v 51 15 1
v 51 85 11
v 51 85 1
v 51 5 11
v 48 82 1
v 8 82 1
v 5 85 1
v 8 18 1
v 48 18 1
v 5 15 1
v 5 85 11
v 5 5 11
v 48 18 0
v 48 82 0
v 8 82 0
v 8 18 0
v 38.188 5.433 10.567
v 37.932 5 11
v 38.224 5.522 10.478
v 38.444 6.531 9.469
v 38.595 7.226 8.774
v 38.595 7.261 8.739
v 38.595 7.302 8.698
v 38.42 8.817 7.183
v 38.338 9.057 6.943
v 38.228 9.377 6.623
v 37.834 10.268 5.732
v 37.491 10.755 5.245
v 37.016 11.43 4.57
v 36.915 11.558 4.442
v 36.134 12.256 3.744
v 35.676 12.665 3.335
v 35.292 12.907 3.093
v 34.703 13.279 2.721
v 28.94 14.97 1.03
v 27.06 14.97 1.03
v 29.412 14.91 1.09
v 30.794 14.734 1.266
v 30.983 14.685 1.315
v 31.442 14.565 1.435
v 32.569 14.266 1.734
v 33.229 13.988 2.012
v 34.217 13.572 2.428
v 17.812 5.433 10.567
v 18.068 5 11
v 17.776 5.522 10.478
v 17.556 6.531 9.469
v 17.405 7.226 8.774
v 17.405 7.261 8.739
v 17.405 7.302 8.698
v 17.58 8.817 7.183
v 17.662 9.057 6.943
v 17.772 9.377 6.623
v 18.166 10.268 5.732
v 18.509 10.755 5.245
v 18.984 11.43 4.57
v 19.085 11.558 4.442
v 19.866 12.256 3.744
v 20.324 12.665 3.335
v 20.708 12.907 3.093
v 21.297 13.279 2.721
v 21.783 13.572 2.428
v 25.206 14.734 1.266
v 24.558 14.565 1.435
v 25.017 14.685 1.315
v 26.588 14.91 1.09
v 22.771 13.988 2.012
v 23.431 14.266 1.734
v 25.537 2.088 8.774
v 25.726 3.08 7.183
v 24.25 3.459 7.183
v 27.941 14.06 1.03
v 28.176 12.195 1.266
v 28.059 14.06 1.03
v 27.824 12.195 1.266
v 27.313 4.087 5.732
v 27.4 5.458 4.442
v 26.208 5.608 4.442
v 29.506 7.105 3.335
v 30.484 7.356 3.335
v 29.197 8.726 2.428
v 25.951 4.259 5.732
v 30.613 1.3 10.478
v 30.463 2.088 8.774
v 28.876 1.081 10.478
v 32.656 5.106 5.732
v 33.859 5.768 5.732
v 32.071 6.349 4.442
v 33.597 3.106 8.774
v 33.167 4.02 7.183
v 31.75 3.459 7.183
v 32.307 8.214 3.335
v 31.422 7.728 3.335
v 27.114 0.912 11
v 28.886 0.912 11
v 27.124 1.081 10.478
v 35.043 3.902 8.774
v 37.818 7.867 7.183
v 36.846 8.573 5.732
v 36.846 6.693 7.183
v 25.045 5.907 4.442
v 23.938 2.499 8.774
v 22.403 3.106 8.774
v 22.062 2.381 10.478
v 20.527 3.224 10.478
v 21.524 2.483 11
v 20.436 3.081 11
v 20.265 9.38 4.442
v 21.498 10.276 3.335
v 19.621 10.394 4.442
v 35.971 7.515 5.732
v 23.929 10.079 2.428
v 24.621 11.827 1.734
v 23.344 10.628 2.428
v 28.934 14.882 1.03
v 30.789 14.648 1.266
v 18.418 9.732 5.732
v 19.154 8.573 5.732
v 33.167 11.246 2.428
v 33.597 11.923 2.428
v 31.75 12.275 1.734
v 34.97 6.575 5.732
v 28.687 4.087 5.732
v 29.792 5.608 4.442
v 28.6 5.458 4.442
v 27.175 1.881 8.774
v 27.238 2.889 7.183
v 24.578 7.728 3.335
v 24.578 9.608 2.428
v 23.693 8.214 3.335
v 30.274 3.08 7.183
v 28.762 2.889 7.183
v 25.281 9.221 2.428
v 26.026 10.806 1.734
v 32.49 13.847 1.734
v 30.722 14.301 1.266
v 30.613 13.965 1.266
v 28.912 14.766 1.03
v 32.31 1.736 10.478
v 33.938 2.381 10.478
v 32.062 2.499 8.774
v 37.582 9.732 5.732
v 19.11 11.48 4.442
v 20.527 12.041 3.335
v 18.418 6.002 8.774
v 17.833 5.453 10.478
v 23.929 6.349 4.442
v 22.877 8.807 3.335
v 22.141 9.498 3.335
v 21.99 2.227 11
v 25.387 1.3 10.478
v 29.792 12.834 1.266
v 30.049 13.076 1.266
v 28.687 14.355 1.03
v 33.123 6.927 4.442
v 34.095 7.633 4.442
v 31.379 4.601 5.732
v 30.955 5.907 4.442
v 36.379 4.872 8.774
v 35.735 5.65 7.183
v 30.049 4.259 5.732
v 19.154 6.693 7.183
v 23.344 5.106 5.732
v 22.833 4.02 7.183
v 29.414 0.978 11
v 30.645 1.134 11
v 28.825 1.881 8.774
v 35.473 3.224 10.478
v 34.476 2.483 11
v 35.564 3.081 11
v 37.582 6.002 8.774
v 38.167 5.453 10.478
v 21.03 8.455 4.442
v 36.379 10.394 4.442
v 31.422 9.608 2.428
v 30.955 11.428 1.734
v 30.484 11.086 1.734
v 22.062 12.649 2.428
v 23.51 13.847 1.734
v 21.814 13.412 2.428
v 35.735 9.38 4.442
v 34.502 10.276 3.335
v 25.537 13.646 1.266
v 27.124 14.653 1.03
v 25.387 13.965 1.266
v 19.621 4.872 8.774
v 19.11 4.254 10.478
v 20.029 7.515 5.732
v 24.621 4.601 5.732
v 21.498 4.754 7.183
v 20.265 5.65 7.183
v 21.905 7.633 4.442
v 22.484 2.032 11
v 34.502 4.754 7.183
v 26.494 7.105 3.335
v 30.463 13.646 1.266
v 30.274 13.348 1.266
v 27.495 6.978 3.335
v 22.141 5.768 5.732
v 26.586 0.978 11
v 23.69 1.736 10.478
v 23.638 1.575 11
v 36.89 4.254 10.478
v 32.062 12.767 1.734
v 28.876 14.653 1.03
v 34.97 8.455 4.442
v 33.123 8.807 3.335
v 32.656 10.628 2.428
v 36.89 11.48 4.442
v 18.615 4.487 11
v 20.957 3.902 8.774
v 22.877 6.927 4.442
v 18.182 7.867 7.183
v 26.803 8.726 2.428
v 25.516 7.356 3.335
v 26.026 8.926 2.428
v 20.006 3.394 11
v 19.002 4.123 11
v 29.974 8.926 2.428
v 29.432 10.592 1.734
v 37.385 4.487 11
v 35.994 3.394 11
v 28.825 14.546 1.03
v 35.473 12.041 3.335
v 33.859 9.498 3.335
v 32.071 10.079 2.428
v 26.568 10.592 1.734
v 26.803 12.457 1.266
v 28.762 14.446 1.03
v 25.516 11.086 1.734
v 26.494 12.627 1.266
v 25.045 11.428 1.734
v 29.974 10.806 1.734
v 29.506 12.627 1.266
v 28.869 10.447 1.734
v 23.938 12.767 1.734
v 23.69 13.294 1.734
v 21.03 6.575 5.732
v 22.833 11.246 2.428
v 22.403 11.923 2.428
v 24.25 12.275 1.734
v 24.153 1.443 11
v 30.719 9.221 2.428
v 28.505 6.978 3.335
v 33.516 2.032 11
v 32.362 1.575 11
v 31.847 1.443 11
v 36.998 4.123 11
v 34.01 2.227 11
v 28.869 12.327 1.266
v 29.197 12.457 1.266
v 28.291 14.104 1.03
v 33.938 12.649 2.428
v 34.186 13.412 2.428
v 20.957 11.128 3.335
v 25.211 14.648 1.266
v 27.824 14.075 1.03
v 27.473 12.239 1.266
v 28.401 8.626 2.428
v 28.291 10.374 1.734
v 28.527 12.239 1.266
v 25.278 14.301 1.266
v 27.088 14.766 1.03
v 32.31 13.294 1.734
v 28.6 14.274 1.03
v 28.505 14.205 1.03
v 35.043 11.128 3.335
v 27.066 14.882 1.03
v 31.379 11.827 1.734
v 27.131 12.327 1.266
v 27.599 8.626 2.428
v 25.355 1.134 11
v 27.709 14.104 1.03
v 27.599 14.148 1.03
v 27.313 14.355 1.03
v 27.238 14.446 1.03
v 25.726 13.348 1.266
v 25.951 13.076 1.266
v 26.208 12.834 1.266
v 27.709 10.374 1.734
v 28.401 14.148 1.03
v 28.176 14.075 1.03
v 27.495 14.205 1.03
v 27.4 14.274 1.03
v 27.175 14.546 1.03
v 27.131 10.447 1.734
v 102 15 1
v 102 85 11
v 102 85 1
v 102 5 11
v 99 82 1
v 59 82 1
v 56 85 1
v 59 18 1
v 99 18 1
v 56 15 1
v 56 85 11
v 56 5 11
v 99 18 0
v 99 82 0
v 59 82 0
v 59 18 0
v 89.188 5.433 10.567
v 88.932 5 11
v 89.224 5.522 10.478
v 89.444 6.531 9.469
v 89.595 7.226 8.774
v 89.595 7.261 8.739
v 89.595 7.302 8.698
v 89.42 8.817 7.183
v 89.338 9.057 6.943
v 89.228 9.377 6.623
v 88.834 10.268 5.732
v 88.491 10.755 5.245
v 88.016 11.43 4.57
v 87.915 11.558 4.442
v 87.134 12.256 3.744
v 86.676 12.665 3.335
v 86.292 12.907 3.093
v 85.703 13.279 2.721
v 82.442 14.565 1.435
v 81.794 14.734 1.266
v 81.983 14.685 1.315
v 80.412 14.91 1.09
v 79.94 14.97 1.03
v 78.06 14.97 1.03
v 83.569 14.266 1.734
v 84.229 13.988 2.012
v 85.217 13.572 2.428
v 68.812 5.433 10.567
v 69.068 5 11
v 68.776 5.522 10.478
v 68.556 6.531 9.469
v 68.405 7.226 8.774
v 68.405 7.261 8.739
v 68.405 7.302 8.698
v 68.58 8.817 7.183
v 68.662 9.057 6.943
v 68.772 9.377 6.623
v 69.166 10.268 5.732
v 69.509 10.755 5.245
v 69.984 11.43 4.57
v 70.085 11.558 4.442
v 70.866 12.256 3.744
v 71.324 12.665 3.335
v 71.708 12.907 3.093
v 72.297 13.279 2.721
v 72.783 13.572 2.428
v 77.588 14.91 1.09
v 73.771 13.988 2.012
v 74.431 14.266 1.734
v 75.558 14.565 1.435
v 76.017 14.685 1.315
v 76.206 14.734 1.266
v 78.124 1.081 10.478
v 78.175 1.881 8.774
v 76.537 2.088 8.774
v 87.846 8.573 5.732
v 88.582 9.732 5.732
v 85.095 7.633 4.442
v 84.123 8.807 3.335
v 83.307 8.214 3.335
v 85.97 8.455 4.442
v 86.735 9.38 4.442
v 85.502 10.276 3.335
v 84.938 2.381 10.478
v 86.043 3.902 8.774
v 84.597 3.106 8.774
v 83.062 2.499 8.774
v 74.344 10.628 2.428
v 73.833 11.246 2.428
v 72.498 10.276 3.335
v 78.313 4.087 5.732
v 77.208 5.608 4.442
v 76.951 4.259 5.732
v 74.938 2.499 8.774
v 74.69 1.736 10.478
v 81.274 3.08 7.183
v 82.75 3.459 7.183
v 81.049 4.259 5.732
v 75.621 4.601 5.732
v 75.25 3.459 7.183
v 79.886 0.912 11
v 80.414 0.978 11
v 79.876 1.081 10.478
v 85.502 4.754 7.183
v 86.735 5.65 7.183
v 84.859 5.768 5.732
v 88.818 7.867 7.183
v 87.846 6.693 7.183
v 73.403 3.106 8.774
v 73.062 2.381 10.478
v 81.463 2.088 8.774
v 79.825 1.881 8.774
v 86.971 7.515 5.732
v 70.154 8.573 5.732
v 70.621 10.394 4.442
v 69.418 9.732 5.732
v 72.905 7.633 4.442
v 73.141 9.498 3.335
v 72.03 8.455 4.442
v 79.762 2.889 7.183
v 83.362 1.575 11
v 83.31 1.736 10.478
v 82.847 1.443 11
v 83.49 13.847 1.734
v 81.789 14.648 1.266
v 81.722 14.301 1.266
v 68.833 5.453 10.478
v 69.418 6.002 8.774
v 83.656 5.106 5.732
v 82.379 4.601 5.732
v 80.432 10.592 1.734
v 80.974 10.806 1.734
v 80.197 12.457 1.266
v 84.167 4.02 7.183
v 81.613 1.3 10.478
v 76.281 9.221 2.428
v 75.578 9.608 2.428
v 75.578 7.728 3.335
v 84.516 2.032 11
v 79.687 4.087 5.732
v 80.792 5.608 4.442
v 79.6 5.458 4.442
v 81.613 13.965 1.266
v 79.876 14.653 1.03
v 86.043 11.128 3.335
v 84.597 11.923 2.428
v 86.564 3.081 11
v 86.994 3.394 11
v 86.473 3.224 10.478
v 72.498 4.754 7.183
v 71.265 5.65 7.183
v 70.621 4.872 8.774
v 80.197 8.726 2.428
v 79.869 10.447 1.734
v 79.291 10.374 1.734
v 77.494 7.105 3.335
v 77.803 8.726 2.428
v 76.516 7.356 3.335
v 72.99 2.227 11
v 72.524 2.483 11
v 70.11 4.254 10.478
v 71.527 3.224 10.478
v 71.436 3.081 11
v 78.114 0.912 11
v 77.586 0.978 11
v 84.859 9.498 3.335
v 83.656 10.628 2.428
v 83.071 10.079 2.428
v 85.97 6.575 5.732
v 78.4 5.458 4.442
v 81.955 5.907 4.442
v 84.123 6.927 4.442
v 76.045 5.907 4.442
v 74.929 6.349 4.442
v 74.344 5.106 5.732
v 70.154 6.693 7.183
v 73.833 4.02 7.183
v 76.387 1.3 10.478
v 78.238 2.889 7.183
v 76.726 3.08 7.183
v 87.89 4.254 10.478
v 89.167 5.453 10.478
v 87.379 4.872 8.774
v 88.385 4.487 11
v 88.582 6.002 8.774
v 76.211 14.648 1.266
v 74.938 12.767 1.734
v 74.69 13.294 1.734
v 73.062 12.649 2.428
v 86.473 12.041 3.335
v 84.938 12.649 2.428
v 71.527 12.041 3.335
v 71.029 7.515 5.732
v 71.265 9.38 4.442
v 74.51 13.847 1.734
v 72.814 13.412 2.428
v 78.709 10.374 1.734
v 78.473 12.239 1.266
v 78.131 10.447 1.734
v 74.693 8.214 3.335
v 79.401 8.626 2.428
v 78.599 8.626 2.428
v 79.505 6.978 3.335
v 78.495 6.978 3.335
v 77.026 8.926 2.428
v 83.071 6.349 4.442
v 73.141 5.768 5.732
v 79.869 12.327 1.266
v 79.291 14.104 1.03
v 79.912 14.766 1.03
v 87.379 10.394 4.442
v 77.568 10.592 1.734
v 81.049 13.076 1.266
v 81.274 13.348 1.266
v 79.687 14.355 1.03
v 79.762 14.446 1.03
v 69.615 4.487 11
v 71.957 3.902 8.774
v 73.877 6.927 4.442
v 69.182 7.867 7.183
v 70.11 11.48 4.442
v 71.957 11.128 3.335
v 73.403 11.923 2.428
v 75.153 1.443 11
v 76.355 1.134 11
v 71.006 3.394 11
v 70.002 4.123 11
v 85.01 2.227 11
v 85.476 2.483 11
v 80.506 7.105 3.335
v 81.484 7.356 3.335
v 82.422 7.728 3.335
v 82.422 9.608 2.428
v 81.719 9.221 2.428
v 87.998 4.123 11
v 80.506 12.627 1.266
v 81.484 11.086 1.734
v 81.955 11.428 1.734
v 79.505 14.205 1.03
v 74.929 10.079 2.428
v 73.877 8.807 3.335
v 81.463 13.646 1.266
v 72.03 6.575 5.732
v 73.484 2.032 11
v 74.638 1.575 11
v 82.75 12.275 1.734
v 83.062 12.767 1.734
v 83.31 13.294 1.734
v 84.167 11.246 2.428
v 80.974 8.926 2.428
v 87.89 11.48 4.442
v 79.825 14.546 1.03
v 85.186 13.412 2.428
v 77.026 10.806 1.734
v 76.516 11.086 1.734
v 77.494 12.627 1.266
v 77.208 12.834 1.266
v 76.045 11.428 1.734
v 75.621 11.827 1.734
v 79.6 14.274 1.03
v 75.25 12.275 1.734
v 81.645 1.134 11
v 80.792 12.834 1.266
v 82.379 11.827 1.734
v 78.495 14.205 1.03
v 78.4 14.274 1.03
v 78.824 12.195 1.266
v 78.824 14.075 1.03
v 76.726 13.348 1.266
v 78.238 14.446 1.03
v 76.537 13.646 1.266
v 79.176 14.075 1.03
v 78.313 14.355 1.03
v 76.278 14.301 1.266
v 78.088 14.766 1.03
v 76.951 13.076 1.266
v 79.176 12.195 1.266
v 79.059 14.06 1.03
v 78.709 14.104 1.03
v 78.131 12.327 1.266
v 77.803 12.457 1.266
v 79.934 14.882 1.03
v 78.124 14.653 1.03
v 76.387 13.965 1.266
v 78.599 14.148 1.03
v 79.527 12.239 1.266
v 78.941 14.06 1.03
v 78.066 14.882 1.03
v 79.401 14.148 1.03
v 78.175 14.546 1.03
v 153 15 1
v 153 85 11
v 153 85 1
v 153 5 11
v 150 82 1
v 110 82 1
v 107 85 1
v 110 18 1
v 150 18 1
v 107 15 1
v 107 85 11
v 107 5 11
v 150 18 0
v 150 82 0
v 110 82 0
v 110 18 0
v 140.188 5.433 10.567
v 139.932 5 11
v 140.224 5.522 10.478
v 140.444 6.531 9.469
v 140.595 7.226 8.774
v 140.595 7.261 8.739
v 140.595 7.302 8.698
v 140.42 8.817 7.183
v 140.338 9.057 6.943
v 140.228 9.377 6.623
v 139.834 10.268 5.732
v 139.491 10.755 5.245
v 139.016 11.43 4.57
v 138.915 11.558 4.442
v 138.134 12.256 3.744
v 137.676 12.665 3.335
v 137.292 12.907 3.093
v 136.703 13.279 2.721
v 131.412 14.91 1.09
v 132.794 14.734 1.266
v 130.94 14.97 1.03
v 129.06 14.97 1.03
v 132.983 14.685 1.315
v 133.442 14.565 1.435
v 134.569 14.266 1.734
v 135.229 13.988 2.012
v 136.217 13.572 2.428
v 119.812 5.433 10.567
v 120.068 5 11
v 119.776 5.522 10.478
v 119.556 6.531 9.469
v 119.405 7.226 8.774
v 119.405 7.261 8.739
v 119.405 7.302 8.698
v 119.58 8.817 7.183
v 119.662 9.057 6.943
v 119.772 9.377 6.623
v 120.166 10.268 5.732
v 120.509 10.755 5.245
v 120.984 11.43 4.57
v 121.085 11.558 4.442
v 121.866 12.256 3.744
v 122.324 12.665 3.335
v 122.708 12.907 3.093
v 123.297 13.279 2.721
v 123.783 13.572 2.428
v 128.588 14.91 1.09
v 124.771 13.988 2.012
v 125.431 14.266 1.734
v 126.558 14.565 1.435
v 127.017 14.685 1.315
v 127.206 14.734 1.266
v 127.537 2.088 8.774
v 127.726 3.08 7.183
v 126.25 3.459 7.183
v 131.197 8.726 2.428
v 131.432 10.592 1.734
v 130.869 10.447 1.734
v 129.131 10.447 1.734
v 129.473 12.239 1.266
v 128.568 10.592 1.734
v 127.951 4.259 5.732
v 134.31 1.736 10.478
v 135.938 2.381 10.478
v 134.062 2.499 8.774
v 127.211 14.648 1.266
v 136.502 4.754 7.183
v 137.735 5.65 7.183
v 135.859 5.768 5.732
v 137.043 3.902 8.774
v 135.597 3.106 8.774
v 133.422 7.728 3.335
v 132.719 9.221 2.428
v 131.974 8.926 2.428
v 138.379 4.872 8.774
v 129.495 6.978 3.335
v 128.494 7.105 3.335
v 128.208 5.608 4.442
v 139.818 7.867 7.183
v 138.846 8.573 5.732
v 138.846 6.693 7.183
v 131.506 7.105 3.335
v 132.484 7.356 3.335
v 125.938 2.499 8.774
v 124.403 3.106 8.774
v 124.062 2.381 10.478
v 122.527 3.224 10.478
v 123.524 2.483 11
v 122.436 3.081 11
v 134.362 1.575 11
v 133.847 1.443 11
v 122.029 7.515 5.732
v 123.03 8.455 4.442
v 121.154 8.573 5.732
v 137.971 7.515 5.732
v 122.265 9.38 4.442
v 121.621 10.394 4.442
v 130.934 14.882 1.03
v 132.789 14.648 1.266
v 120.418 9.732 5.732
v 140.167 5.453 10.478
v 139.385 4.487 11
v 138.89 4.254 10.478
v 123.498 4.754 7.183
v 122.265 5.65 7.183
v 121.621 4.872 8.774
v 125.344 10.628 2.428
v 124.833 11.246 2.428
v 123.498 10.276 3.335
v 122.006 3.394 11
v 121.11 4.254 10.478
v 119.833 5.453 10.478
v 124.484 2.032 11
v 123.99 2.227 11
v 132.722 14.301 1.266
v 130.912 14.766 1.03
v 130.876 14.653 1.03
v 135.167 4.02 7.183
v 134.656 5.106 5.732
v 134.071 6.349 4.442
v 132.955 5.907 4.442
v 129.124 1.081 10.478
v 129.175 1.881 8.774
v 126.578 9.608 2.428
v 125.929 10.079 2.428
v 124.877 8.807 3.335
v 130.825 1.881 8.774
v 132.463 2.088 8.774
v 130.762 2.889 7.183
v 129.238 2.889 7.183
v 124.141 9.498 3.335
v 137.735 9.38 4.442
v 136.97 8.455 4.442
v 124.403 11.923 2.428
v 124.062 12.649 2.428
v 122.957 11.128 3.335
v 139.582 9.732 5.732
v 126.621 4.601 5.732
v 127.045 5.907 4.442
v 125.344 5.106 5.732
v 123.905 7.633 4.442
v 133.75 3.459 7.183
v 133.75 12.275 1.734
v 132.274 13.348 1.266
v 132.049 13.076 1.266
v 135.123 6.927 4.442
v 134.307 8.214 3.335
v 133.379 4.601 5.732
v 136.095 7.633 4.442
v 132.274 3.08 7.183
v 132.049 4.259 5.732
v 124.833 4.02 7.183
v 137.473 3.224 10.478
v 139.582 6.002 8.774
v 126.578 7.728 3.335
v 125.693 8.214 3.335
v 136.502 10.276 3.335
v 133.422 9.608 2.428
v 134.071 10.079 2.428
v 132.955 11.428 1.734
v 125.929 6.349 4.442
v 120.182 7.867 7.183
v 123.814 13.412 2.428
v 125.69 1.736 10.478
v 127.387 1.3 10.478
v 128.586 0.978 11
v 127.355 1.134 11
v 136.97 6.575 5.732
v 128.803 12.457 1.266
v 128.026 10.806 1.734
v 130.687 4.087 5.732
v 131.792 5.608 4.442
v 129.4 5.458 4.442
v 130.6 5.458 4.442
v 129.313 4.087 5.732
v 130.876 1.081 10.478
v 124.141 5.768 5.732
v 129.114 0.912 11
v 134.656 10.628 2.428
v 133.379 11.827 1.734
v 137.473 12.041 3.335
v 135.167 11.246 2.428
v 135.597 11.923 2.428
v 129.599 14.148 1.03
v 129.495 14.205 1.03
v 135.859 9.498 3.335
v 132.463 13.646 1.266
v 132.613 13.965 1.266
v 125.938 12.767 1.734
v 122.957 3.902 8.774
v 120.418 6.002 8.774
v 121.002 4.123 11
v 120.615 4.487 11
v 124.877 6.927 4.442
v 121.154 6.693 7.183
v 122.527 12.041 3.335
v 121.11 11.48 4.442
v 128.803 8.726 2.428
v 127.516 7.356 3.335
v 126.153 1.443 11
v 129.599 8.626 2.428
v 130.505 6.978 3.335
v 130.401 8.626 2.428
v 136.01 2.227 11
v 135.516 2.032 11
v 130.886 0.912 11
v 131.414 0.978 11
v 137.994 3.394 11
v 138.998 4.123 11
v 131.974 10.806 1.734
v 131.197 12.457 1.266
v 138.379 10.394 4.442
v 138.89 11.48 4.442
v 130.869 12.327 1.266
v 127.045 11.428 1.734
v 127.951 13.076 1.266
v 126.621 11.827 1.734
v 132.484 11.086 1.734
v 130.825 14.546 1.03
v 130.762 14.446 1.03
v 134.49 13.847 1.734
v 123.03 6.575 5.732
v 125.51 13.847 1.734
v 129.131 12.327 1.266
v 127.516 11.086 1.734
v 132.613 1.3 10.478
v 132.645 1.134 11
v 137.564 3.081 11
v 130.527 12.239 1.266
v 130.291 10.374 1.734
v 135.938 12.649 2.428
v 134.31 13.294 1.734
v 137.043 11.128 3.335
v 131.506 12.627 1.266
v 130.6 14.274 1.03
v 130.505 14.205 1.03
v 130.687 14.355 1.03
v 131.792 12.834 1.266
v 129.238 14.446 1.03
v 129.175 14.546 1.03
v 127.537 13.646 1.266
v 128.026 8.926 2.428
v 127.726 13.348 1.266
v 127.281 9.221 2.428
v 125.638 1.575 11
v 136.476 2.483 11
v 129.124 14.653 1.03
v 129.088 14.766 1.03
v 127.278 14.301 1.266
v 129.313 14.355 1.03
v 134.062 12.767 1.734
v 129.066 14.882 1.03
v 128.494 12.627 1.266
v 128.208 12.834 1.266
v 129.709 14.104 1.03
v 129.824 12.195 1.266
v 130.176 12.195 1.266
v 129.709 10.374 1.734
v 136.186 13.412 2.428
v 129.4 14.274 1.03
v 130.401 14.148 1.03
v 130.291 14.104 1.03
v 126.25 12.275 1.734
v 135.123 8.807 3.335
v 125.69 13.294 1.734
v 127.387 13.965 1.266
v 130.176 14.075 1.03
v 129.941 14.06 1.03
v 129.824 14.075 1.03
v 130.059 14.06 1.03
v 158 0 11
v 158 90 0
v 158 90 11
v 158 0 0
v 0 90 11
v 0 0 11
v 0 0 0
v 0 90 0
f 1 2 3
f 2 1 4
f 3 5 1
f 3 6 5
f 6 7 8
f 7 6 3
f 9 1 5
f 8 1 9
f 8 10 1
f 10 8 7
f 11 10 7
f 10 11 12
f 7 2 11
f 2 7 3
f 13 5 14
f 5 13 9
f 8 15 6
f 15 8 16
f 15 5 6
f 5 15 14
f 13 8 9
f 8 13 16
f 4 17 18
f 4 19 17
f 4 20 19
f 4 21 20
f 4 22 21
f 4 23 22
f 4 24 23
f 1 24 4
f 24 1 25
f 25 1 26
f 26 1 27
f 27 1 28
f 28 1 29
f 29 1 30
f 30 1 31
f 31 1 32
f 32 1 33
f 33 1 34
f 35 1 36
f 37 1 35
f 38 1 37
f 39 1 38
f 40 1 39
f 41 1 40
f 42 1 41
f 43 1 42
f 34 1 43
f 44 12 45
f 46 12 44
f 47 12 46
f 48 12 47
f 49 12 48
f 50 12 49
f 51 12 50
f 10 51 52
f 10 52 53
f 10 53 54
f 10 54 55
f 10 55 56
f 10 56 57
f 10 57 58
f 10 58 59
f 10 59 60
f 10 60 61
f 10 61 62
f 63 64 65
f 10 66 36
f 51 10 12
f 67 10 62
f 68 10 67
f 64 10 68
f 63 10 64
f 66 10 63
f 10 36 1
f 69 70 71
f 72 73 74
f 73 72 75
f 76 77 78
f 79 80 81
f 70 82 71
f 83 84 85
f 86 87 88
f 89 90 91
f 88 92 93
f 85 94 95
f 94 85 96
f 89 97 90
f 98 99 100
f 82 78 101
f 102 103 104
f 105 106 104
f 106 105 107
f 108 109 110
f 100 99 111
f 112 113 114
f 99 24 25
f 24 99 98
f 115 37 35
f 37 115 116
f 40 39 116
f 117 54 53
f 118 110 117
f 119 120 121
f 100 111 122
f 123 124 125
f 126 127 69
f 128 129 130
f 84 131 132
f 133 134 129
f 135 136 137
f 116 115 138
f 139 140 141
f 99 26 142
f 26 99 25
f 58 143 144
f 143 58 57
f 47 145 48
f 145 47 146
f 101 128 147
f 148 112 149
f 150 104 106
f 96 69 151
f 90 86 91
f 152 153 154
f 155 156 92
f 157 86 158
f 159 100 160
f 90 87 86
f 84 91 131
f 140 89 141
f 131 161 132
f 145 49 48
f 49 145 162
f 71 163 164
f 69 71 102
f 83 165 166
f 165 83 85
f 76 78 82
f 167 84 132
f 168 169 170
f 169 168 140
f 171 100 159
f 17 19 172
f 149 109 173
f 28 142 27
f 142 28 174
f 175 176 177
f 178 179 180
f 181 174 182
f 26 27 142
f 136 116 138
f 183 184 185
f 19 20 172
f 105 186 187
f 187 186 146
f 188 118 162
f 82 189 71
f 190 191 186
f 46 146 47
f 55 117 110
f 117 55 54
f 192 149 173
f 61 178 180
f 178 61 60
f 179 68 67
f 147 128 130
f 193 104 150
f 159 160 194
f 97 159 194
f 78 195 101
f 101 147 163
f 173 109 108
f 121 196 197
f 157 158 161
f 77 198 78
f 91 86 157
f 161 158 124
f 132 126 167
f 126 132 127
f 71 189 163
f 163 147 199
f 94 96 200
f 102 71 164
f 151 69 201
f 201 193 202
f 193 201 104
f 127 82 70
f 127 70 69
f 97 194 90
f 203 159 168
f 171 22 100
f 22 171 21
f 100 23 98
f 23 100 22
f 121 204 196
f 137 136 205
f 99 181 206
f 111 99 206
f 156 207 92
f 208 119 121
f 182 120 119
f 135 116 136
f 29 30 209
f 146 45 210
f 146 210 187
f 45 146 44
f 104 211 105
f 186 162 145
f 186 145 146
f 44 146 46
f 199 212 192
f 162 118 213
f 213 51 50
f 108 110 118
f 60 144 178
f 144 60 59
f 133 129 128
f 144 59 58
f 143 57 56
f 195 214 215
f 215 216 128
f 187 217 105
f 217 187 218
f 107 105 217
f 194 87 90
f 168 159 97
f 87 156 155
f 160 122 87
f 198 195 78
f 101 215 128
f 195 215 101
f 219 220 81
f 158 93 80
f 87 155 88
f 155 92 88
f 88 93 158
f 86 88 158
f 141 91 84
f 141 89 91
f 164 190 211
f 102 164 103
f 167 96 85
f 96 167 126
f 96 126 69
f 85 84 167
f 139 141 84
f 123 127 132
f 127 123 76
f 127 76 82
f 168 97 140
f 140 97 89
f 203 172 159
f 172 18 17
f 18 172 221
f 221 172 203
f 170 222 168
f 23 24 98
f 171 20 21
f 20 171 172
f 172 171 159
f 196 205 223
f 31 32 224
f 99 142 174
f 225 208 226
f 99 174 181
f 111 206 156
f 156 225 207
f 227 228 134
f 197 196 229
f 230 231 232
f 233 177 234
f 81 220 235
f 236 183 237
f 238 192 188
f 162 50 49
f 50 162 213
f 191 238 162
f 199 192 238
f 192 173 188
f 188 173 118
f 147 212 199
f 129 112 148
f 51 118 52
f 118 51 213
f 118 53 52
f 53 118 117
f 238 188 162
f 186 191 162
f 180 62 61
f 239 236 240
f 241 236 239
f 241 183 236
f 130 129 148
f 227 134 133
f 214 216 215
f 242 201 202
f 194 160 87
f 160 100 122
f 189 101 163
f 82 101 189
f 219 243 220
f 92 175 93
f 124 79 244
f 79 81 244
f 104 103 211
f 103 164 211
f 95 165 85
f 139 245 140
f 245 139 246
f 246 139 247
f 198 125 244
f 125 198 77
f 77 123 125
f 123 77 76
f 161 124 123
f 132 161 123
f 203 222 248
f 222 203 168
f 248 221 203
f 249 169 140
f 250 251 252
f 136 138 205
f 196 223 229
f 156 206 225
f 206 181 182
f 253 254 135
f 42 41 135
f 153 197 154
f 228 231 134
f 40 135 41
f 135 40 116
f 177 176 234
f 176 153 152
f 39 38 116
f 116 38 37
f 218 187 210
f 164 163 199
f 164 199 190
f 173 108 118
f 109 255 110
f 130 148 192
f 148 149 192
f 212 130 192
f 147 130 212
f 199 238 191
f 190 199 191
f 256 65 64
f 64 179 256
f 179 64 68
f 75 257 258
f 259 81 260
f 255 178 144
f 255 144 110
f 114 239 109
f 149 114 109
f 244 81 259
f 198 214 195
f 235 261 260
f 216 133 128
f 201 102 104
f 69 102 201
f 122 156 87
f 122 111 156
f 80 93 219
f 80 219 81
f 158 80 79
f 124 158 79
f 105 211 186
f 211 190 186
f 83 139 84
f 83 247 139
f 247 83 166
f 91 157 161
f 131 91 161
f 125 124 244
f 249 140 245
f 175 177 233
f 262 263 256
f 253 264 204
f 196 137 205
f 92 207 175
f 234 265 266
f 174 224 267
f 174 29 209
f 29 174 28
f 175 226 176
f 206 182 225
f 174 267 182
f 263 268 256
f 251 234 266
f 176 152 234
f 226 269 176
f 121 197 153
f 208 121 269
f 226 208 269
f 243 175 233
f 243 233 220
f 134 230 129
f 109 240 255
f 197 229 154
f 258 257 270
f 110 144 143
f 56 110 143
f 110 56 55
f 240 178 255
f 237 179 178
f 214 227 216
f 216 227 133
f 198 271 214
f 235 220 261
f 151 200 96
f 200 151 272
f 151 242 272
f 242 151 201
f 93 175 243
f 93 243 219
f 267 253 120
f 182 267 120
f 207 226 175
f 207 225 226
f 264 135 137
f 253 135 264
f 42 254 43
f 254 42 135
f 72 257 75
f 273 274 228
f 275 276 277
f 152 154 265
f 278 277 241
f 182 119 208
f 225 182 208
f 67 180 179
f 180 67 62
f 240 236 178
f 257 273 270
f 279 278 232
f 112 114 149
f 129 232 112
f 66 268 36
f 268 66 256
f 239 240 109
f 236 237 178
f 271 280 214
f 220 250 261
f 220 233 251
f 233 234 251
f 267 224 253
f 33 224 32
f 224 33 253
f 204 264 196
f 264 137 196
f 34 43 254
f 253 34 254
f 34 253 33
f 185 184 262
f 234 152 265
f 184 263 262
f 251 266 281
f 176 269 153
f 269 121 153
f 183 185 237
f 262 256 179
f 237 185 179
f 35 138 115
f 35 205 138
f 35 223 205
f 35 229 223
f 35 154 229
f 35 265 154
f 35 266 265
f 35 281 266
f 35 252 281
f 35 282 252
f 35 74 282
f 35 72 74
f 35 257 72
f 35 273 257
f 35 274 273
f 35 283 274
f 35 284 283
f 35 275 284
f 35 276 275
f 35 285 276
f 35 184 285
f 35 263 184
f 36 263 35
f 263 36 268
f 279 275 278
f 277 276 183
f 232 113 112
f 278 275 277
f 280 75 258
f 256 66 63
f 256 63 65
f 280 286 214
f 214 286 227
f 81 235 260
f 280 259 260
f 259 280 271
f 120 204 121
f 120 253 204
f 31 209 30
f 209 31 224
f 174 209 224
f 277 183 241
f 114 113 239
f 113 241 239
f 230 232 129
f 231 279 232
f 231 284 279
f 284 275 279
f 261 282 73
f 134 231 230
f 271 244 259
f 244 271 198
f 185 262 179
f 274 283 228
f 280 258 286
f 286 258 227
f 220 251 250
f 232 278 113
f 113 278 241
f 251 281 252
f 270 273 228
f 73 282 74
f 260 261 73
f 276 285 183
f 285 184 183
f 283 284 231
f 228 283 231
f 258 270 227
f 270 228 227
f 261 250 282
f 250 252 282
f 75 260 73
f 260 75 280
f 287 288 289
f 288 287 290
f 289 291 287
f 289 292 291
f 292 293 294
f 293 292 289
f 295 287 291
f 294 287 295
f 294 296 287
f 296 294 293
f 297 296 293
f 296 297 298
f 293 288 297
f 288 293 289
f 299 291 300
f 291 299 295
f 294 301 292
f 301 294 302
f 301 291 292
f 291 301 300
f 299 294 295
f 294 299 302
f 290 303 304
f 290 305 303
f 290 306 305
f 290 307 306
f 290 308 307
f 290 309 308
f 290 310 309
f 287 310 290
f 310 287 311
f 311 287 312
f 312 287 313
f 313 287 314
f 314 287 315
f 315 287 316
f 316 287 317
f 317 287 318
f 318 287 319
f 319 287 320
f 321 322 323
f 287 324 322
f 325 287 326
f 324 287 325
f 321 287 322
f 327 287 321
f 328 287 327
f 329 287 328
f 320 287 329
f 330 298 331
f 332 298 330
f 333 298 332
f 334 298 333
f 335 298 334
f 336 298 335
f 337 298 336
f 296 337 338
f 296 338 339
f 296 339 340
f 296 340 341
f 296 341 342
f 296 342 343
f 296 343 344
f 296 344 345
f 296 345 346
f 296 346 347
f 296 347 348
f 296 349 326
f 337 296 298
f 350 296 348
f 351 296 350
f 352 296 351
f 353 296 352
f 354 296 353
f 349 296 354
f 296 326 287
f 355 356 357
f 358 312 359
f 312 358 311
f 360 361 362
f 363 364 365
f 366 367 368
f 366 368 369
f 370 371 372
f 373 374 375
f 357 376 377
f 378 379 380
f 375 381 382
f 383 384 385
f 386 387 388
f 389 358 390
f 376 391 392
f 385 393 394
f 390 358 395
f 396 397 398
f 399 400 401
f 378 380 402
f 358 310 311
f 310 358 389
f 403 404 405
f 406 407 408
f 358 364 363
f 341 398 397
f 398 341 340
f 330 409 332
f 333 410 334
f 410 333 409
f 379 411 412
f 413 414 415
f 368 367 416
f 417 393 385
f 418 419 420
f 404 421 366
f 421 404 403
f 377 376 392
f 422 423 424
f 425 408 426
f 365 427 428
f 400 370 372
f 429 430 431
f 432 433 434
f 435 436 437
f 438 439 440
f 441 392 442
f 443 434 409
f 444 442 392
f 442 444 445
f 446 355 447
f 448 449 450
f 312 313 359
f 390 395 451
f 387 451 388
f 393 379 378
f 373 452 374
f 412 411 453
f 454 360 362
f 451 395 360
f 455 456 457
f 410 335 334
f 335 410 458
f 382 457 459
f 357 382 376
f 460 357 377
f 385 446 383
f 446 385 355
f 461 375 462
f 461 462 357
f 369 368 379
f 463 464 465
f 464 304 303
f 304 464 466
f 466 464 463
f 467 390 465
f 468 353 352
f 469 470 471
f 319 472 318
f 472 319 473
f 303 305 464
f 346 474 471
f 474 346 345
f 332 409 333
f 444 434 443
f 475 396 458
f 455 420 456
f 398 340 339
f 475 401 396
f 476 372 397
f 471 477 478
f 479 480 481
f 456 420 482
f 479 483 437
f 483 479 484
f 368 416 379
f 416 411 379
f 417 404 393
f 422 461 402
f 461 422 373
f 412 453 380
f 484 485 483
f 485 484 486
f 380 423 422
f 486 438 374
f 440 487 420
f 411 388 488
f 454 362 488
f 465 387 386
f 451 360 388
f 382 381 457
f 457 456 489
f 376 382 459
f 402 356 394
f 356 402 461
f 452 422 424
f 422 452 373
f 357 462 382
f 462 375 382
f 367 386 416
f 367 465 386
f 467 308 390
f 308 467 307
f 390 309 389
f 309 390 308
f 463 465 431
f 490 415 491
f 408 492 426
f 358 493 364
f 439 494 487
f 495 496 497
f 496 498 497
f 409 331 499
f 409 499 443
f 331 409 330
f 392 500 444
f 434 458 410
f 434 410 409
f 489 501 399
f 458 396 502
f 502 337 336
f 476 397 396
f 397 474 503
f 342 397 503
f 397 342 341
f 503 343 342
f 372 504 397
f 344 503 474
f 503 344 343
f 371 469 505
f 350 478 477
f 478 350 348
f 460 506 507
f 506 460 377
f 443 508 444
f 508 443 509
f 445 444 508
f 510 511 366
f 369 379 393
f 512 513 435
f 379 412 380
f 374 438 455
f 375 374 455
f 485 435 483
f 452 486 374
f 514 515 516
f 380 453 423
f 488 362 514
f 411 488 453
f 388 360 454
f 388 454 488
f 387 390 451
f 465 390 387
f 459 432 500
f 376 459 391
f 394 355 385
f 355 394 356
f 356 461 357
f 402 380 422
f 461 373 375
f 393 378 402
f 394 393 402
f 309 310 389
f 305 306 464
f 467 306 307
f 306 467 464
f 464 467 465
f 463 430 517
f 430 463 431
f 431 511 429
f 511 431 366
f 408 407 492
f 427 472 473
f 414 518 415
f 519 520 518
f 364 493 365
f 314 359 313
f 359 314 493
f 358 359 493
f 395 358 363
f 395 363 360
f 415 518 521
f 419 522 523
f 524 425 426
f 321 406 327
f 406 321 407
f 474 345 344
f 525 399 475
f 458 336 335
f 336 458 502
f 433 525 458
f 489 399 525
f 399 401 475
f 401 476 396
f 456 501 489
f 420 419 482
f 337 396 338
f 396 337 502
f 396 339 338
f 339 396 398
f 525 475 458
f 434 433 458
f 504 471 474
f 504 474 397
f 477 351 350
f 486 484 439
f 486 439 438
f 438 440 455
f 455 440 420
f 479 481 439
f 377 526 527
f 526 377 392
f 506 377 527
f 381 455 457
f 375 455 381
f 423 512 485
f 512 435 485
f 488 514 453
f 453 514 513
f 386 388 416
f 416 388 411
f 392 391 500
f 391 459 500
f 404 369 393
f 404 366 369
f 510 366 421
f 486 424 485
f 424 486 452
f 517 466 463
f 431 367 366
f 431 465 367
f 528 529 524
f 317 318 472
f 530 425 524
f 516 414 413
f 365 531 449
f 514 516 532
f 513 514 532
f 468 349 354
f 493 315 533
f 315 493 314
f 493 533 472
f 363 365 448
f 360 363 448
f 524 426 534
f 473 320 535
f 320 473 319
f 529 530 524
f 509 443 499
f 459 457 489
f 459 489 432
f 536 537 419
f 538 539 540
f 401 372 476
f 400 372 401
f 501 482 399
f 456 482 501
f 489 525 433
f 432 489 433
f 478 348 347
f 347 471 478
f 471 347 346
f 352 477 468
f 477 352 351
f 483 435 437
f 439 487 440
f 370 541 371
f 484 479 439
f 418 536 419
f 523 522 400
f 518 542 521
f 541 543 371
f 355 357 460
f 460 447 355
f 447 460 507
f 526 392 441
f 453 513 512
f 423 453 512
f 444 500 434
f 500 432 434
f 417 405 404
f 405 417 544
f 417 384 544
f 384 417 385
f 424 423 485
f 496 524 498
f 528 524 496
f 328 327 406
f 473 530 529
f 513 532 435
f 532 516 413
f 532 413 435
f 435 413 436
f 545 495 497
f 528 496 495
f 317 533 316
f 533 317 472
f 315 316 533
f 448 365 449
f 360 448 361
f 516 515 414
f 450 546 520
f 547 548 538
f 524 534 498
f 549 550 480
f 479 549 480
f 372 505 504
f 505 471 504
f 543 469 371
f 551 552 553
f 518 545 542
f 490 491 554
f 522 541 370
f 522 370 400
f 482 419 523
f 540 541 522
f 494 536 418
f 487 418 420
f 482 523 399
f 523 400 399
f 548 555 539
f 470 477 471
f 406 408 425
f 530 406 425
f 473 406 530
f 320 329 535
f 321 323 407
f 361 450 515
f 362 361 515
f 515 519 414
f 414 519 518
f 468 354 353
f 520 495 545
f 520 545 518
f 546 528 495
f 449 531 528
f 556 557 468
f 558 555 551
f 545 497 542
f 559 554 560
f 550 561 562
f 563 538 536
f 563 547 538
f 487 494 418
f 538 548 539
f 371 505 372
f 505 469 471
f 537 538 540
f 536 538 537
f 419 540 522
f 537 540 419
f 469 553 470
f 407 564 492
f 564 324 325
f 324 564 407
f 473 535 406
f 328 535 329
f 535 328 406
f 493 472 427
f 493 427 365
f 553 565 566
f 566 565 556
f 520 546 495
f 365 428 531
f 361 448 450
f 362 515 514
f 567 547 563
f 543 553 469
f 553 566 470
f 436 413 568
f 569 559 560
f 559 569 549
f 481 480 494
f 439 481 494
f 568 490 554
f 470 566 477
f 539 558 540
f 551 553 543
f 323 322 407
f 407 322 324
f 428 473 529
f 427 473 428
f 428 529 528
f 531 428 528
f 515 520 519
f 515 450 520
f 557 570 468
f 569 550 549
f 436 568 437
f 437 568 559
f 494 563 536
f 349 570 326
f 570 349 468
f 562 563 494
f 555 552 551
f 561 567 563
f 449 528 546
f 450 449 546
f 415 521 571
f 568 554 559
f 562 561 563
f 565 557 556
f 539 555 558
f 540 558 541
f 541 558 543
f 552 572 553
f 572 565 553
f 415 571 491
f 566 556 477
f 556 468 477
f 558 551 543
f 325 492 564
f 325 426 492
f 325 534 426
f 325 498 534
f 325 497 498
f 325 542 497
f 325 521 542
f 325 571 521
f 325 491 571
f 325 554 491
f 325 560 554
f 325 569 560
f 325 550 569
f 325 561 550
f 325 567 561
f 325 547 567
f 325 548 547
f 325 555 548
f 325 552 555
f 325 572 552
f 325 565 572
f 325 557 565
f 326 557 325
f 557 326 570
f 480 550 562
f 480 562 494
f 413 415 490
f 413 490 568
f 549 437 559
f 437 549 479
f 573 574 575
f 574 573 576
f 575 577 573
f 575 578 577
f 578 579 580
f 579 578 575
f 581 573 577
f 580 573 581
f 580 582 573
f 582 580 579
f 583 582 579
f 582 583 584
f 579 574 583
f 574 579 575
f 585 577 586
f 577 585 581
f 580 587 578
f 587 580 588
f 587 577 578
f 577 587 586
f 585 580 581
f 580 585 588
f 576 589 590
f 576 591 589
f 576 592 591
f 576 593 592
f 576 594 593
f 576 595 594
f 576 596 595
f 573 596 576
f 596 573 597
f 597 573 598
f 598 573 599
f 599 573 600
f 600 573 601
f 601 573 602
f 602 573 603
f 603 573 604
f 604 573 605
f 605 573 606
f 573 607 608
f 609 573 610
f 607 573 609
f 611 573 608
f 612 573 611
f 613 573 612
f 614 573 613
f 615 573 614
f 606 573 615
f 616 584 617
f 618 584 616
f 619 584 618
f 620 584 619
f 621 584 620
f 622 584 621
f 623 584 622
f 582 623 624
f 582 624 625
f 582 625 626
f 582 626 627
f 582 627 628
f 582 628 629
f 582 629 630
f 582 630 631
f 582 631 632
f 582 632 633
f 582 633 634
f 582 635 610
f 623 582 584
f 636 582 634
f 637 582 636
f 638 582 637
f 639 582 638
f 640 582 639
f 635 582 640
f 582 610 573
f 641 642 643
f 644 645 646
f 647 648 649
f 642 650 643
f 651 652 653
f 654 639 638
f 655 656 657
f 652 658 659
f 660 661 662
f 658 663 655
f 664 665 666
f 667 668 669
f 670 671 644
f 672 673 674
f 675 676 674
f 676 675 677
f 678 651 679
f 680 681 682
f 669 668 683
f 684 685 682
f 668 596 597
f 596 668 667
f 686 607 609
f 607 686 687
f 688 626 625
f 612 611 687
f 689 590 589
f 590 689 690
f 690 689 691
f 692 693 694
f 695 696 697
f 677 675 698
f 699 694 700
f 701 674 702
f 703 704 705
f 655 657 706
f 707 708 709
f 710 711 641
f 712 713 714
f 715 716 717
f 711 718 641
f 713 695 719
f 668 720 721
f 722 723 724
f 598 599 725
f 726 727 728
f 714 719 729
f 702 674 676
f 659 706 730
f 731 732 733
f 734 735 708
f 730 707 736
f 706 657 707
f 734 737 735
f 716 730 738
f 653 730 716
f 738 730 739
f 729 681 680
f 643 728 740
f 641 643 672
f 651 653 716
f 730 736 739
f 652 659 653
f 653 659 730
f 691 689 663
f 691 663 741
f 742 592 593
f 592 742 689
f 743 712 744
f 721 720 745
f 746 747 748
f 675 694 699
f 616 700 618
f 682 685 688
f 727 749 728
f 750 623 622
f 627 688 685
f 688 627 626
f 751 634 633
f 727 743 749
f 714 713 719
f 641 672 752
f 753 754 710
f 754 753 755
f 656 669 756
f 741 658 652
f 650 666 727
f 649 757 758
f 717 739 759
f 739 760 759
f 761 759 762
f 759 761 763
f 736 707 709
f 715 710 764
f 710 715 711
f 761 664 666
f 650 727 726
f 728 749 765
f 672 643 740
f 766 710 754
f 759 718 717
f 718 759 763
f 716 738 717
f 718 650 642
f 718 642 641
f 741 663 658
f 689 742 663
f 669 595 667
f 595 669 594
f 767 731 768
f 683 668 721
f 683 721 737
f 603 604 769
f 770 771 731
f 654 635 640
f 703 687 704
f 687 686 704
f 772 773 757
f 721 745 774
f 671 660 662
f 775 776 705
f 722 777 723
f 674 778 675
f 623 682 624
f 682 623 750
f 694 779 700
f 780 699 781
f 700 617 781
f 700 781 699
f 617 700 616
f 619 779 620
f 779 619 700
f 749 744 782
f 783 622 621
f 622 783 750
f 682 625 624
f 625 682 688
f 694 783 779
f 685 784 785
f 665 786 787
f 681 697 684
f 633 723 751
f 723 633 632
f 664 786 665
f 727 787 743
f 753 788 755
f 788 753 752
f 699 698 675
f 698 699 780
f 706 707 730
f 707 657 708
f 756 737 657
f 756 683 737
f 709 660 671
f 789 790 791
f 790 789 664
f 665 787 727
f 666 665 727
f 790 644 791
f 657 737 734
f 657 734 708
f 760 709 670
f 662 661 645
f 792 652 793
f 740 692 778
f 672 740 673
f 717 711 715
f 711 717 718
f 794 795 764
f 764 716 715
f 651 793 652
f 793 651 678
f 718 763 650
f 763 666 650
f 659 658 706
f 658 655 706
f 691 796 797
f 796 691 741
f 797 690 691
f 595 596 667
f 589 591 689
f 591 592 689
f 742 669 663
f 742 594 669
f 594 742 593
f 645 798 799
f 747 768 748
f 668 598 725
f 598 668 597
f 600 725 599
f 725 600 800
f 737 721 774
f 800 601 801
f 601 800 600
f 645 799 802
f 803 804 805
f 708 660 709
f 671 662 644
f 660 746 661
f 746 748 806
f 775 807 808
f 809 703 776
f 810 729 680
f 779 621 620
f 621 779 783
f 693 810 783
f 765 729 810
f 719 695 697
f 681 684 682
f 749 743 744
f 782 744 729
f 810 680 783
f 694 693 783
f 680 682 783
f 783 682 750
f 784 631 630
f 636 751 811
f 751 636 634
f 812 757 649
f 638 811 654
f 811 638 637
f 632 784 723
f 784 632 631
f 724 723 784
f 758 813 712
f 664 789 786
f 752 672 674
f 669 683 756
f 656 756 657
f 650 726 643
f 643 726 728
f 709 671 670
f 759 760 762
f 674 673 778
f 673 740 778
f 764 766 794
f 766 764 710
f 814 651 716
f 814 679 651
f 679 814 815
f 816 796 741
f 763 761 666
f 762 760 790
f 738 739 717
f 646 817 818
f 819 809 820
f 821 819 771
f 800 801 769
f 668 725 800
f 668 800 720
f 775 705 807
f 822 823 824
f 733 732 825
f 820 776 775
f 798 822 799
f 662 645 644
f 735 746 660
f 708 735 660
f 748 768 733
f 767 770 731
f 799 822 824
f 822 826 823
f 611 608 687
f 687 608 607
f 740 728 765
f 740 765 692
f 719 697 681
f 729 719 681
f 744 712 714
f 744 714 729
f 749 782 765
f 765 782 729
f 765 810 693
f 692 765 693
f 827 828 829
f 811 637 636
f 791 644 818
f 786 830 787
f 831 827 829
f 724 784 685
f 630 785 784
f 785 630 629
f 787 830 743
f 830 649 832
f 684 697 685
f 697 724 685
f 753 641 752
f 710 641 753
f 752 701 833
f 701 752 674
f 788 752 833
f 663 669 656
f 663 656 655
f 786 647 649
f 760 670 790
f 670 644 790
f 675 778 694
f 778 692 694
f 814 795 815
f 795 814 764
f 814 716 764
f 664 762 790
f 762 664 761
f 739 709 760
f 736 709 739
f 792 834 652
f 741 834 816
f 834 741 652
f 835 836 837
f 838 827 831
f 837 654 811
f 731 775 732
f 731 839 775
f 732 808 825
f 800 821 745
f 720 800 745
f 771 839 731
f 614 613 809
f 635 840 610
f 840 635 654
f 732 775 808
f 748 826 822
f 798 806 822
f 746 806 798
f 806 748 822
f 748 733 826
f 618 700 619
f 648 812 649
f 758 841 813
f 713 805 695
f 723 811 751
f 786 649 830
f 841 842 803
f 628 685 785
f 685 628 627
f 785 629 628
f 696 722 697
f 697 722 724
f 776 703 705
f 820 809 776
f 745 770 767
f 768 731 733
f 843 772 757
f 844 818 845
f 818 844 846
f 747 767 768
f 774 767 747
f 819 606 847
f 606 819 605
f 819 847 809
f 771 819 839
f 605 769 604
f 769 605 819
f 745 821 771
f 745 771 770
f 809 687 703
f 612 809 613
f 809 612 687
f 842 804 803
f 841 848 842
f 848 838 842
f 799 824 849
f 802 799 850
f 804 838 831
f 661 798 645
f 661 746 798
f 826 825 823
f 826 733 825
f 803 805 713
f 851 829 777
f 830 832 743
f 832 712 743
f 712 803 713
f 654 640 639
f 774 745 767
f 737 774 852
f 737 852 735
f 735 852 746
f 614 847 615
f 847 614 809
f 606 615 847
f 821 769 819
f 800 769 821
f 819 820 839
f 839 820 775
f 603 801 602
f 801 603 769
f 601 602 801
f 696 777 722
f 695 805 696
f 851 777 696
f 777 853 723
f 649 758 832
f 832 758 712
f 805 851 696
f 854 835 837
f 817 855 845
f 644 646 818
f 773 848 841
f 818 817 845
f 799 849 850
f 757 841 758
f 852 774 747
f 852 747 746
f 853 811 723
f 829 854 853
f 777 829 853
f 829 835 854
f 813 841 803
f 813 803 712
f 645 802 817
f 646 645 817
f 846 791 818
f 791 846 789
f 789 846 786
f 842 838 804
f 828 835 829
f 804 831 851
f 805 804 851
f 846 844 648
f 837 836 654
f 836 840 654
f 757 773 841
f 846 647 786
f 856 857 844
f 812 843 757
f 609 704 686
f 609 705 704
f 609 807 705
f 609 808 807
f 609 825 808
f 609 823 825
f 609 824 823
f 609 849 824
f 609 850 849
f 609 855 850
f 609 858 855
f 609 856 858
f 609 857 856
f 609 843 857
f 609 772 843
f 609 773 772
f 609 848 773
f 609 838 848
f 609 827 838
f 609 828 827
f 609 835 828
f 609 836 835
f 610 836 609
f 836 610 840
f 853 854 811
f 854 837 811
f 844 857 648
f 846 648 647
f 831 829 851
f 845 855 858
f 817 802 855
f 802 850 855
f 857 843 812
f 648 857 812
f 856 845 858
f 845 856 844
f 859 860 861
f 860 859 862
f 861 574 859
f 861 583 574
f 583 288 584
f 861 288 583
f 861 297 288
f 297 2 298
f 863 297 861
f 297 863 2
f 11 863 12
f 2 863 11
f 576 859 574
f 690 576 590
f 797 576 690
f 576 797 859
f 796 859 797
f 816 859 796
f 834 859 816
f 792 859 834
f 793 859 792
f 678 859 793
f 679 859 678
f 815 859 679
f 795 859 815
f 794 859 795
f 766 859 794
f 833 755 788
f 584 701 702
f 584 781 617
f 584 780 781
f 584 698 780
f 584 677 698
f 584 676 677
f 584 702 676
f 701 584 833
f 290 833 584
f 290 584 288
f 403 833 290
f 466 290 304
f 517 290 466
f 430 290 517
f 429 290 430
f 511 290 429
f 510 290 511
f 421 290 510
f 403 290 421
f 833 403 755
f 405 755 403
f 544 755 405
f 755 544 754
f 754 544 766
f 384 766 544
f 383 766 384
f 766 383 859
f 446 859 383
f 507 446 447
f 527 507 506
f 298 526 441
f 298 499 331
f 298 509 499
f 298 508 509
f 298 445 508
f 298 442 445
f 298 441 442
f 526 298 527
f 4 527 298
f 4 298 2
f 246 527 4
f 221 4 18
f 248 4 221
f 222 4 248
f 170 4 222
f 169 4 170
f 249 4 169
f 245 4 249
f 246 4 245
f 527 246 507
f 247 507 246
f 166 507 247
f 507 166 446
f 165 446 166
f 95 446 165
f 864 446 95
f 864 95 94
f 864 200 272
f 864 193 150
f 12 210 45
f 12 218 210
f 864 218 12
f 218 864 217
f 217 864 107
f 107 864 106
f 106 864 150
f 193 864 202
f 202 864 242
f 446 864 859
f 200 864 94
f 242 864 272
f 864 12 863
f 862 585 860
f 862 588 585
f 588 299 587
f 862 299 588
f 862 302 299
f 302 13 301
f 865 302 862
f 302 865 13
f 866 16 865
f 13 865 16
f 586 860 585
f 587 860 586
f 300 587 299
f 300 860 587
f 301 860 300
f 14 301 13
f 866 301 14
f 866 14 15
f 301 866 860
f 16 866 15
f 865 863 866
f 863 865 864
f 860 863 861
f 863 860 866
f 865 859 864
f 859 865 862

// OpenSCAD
// All measurements are in millimeters.

/* [Parameters] */

// The width of a card. We'll add buffer space later, so measure this as accurately as possible.
card_width = 44;

// The height of a card. We'll add buffer space later, so measure this as accurately as possible.
card_height = 68;

// The number of card wells.
number_of_wells = 3; // [1:6]

// The depth of the wells. 25 cards fit nicely per 10mm.
well_depth = 10;

/* [Tweaks] */

// The width of the border material around the edge of the caddy.
caddy_border_width = 5;

// The empty buffer space to leave around a card in a well.
card_well_buffer_spacing = 1; // [1.0: loose, 0.5: tight]

// The space between adjacent cards. (I.e., the width of the divider between cells plus double
// the card well buffer spacing.) The default value calculated here will result in a divider
// width that's equal to the outside caddy_border_width width. If this caddy is to be placed
// over existing markings on a board, it can be overridden with an explicit value. Must be a
// minimum of 1 + (card_well_buffer_spacing * 2).
card_padding = caddy_border_width + (card_well_buffer_spacing * 2);

// The well shelf is the edge around the bottom of the well that keeps the cards from falling out. This parameter controls its depth.
well_shelf_depth = 1;

// This parameter controls the well shelf width. Set it to a really big value if you want a solid shelf.
well_shelf_width = 3;

// The size of the finger cutout.
filger_cutout_size = 15;

// Used to finely tweak the finger cutout front/back location.
filger_cutout_y_tweak = 0;

// Used to finely tweak the finger cutout up/down location.
filger_cutout_z_tweak = well_shelf_depth;

// The height of the card wells.
card_well_height = card_height + (card_well_buffer_spacing * 2);

// The width of the card wells.
card_well_width = card_width + (card_well_buffer_spacing * 2);

// The space between card wells.
card_well_padding = card_padding - (card_well_buffer_spacing * 2);

// Resolution.
$fn = 50 * 1;

// preview[view:north east, tilt:top diagonal]

difference() {

  // base brick
  cube([
    (card_well_width * number_of_wells) + (card_well_padding * (number_of_wells - 1)) + (caddy_border_width * 2),
    card_well_height + (caddy_border_width * 2) + well_depth,
    well_depth + well_shelf_depth
  ]);

  for (i = [0 : number_of_wells - 1]) {

    x = (i * (card_well_width + card_well_padding)) + caddy_border_width;
    y = caddy_border_width + well_depth;

    // card well
    translate([x, y, well_shelf_depth]) {
      cube([card_well_width, card_well_height, well_depth + 1]);
    }

    // card well shelf
    translate([x + well_shelf_width, y + well_shelf_width, -well_shelf_width]) {
      cube([
        card_well_width - (2 * well_shelf_width),
        card_well_height - (2 * well_shelf_width),
        well_depth + well_shelf_depth + 1
      ]);
    }

    // bevel
    translate([x, y, well_shelf_depth]) {
      rotate([45, 0, 0]) {
        cube([card_well_width, well_depth, well_depth * 2]);
      }
    }

    // finger cutout
    translate([
      x + (card_well_width / 2),
      filger_cutout_size + filger_cutout_y_tweak,
      filger_cutout_size + filger_cutout_z_tweak
    ]) {
      sphere(filger_cutout_size);
    }
    
  }

}
